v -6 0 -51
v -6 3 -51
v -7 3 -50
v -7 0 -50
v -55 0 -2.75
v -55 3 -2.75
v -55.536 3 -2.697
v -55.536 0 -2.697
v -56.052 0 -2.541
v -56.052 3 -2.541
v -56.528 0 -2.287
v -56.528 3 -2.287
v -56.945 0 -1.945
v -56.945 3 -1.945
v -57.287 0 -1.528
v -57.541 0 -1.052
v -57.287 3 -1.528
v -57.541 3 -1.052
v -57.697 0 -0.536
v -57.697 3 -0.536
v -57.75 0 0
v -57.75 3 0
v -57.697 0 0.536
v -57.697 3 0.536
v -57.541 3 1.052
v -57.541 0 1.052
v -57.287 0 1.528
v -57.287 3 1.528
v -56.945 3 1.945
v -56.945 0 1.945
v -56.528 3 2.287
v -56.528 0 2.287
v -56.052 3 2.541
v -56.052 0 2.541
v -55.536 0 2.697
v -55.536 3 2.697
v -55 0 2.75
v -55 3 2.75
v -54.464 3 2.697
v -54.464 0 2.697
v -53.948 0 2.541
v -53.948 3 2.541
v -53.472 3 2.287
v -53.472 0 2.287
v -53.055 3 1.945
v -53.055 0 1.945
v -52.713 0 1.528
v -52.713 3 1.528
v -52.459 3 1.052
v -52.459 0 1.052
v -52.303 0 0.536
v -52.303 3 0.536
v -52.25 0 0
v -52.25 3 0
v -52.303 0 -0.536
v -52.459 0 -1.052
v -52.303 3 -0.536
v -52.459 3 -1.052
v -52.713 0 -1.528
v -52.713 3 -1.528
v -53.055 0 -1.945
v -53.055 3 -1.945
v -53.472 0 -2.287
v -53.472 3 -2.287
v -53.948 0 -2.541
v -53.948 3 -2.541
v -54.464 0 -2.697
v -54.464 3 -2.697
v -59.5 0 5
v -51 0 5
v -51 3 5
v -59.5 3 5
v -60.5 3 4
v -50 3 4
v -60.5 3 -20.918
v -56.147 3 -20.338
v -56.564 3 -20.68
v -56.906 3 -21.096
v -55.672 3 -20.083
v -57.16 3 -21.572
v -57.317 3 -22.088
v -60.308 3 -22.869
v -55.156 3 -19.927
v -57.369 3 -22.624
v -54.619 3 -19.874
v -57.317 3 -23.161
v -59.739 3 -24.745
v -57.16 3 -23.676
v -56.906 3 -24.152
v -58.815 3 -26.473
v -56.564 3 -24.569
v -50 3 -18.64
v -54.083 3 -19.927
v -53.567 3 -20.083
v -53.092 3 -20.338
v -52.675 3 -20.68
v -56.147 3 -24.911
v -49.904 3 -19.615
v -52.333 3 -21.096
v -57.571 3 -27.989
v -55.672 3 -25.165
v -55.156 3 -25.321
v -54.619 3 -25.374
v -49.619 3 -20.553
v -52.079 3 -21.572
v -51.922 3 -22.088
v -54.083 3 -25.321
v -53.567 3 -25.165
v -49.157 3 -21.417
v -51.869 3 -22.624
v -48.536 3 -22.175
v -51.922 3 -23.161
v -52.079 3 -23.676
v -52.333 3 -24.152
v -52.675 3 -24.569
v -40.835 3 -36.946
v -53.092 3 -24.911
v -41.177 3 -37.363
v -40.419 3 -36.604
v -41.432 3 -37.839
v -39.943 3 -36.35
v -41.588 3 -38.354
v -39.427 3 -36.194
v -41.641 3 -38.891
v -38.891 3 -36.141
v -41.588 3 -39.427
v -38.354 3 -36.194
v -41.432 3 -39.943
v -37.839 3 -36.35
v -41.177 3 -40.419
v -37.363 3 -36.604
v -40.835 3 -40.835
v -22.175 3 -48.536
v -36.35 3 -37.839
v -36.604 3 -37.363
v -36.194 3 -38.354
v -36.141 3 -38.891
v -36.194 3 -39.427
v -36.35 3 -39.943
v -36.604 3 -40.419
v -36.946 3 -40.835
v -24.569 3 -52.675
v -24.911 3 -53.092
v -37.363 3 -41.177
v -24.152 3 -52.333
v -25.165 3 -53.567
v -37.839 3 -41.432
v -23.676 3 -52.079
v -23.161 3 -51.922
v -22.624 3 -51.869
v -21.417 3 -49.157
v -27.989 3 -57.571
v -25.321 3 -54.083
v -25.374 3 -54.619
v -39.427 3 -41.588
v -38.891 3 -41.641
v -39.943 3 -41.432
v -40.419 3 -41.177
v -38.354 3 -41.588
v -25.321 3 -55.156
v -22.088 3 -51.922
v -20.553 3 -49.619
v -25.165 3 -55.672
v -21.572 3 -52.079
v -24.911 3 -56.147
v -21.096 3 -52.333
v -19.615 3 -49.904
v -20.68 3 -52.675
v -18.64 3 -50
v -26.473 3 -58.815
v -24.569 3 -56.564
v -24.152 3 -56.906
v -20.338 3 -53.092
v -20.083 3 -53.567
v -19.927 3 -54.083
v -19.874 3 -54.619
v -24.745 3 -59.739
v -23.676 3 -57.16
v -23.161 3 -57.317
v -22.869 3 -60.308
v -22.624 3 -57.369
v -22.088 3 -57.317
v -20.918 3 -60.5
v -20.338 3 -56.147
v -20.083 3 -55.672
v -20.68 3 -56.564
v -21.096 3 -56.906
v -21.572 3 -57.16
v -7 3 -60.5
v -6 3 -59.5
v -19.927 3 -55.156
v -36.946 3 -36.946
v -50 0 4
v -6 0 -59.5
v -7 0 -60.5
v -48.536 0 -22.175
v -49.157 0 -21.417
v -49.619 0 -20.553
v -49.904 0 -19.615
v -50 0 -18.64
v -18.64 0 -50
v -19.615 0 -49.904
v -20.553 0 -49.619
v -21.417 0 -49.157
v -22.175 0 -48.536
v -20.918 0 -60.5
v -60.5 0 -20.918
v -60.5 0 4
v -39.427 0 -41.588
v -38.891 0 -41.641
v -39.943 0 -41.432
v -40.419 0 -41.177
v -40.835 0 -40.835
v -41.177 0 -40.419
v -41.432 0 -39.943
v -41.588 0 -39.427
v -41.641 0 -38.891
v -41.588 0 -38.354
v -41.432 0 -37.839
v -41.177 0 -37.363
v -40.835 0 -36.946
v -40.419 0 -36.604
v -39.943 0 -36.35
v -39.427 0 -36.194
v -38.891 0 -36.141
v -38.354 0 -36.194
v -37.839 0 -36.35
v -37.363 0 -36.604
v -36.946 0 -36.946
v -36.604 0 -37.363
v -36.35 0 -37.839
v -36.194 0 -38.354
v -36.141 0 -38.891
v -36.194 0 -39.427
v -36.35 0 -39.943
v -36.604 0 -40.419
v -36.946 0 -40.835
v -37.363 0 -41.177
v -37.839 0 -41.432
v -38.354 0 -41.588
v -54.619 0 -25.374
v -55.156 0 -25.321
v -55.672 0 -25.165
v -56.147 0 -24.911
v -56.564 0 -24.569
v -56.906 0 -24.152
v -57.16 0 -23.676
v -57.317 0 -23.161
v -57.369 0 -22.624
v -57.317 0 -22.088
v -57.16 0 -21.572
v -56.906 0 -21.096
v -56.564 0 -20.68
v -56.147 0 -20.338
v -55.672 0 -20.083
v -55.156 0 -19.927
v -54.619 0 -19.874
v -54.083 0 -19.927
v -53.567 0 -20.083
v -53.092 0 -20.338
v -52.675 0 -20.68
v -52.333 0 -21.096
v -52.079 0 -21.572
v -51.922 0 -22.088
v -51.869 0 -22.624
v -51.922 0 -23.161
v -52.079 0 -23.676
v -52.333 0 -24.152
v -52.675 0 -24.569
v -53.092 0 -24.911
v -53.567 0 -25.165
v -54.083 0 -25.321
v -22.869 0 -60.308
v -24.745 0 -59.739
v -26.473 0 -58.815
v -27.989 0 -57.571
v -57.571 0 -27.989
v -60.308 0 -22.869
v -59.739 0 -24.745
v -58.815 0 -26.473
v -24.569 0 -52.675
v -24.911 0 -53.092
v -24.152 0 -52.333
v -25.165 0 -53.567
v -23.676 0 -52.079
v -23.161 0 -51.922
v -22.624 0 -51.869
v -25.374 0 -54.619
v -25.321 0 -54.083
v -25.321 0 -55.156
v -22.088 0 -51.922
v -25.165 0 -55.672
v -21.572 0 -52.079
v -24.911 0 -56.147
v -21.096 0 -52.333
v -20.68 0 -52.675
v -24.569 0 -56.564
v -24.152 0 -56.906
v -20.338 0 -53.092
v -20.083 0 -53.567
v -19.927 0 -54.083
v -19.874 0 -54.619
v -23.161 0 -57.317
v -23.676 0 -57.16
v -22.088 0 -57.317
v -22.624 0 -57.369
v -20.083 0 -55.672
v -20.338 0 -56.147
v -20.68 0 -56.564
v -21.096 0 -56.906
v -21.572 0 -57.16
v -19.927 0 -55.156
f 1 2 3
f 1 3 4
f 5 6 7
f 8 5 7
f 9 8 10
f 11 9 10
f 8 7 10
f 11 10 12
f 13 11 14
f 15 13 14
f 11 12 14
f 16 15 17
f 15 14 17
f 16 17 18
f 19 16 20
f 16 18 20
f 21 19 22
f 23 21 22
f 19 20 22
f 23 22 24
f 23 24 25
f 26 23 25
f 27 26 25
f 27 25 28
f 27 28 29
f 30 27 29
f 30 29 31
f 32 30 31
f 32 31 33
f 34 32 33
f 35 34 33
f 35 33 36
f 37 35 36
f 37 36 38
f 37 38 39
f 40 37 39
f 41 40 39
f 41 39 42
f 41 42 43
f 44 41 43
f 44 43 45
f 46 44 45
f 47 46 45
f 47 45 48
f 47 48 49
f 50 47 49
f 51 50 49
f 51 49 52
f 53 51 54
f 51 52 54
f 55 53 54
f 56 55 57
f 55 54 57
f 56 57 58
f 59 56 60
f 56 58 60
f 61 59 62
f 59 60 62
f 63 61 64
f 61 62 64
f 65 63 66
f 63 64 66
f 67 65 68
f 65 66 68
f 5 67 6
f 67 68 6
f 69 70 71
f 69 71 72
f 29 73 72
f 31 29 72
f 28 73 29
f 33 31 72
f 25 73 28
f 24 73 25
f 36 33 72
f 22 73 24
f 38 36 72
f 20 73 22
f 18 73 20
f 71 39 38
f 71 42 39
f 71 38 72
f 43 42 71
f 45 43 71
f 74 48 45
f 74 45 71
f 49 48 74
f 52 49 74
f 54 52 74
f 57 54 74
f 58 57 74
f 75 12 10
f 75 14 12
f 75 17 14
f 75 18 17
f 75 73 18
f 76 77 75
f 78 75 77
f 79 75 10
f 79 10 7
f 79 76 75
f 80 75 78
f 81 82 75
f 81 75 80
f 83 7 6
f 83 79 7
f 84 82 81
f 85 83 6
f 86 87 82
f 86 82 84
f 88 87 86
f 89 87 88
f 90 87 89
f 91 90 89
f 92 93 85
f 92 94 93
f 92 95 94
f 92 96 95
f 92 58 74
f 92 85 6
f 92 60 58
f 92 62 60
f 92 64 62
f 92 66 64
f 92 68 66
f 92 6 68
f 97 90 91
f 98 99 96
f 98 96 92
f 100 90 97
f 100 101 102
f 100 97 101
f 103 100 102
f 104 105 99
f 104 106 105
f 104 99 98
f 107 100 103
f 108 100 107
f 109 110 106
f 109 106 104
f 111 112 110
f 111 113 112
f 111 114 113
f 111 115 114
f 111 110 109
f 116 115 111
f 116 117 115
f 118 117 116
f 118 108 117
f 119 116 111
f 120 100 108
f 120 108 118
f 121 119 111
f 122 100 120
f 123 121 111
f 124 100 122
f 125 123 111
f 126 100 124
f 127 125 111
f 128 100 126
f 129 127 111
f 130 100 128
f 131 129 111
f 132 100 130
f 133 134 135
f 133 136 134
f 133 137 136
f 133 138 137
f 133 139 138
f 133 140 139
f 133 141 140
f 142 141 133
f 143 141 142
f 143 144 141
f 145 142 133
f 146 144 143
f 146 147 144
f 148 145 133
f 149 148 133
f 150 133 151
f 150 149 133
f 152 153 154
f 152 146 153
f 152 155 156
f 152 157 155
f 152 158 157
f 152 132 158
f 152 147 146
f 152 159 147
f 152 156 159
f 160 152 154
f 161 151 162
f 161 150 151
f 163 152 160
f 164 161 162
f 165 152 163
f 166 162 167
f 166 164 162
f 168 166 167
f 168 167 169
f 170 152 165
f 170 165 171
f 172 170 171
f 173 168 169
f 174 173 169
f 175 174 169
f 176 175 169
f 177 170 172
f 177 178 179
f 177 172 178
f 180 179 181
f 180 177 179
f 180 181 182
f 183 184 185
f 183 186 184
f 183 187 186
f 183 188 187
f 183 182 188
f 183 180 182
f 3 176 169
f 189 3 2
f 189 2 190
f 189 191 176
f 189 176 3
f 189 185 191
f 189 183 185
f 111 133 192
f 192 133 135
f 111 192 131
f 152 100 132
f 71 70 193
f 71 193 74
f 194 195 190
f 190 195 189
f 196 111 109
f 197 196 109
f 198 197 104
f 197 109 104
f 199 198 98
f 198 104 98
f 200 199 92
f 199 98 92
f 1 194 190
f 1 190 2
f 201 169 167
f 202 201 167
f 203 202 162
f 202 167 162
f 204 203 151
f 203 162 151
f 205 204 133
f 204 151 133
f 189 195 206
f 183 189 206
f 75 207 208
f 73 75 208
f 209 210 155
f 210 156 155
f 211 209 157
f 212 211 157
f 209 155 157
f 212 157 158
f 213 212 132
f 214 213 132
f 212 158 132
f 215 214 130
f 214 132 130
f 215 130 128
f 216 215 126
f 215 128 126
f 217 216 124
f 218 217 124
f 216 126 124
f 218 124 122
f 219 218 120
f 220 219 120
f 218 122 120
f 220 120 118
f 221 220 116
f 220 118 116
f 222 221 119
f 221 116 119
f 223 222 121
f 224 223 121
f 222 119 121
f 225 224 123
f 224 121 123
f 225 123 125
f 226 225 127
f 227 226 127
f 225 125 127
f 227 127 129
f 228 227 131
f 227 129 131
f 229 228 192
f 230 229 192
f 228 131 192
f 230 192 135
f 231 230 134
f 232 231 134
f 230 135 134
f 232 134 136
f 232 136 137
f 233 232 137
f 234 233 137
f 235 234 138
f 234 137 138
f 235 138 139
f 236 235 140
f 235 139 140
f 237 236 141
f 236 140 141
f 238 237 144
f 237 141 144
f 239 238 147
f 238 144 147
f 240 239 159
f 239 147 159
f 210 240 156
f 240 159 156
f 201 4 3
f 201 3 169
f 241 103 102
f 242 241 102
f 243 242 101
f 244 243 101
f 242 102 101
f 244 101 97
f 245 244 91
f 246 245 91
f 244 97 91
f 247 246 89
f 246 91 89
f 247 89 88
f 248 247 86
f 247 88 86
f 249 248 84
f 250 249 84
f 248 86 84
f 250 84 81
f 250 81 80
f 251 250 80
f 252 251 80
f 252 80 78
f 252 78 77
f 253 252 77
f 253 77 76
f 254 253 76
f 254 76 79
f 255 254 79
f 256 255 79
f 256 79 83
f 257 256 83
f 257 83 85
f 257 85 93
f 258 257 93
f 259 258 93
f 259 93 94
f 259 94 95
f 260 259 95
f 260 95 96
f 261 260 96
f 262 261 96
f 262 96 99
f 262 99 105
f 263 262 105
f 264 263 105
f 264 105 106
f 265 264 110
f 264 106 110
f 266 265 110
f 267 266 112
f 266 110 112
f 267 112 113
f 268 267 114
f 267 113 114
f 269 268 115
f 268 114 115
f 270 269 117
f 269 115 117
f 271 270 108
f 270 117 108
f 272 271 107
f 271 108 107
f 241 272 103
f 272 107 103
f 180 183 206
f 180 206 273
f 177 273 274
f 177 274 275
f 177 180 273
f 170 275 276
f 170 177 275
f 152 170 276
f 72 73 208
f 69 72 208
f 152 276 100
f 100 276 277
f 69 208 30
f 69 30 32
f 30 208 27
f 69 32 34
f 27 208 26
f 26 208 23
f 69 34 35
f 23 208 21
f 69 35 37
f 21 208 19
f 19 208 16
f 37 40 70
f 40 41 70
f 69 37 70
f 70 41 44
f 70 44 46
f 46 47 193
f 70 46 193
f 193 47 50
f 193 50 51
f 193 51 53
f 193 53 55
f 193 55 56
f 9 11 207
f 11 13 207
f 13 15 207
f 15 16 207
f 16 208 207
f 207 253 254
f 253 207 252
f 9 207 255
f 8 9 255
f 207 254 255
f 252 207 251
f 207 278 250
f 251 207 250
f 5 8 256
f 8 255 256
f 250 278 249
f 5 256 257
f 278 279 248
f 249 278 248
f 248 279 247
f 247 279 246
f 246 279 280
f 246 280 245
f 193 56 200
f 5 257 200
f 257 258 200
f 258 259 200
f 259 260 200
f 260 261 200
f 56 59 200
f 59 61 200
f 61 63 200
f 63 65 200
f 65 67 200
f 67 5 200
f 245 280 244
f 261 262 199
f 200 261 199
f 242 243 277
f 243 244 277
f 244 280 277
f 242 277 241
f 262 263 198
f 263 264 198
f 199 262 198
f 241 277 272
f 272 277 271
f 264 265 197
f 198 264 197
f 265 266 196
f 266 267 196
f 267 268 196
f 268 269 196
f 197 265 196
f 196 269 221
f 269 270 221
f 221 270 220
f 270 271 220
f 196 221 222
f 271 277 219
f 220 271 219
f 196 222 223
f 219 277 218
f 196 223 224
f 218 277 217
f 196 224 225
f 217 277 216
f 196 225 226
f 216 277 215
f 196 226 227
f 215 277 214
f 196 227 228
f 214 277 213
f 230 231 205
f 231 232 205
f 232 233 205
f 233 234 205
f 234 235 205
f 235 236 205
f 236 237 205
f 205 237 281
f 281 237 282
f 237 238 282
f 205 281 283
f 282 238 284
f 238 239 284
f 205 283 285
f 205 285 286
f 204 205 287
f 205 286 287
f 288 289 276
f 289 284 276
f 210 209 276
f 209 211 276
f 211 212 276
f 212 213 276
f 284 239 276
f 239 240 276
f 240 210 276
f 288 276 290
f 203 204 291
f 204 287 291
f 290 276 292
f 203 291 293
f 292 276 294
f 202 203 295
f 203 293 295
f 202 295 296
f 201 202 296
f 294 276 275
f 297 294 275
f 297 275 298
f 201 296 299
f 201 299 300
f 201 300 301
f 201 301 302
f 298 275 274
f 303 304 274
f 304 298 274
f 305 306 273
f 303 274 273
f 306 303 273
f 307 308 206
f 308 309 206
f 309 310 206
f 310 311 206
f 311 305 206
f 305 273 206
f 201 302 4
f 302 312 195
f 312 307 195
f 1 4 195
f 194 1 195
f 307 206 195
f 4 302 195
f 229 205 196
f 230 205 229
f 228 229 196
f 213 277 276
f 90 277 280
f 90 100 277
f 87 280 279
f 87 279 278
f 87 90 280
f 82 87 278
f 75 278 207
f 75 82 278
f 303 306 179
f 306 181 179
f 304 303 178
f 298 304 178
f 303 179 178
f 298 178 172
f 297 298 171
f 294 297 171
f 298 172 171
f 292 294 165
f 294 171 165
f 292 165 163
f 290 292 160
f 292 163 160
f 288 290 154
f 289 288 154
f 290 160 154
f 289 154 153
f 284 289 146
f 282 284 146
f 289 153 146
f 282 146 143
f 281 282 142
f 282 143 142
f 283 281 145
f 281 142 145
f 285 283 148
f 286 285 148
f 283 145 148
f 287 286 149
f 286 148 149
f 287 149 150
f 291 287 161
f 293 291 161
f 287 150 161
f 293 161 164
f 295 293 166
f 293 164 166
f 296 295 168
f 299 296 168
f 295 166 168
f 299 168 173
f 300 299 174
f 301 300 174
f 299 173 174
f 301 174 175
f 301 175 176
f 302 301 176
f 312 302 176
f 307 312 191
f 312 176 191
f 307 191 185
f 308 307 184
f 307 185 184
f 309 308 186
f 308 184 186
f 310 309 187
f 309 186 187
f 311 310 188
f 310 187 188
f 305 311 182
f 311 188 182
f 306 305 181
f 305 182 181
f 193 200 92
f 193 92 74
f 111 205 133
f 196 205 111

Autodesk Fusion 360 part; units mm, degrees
sketch "Sketch1" plane through (0, 0, 0) normal (0, 1, 0) x (1, 0, 0)
  circle A0 centre (0, 0) radius 55 construction
  line L0 (48, 0) -> (48, 19.8823)
  line L1 (48, 19.8823) -> (19.8823, 48)
  line L2 (19.8823, 48) -> (-19.8823, 48)
  line L3 (-19.8823, 48) -> (-48, 19.8823)
  line L4 (-48, 19.8823) -> (-48, 0)
  line L5 (-48, 0) -> (48, 0) construction
  line L6 (0, -1.75) -> (0, -22.5) construction
  line L7 (50, 0) -> (50, 20.7107)
  line L8 (50, 20.7107) -> (20.7107, 50)
  line L9 (20.7107, 50) -> (-20.7107, 50)
  line L10 (-20.7107, 50) -> (-50, 20.7107)
  line L11 (-50, 20.7107) -> (-50, 0)
  line L12 (0, 0) -> (-54.6194, 22.6241) construction
  line L13 (60.5, 0) -> (60.5, 25.0599)
  line L14 (60.5, 25.0599) -> (25.0599, 60.5)
  line L15 (25.0599, 60.5) -> (-25.0599, 60.5)
  line L16 (-25.0599, 60.5) -> (-60.5, 25.0599)
  line L17 (-60.5, 25.0599) -> (-60.5, 0)
  line L18 (0, 60.5) -> (0, 50)
  line L19 (-50, 0) -> (-50, -5)
  line L20 (-50, -5) -> (-60.5, -5)
  line L21 (-60.5, -5) -> (-60.5, 0)
  line L22 (-6, 60.5) -> (-6, 50)
  point P0 (-55, 0)
  point P1 (-38.8909, -38.8909)
  point P2 (-54.6194, -22.6241)
  point P3 (0, -55)
  point P4 (-22.6241, -54.6194)
  point P5 (38.8909, -38.8909)
  point P6 (22.6241, -54.6194)
  point P7 (55, 0)
  point P8 (54.6194, -22.6241)
  point P9 (38.8909, 38.8909)
  point P10 (54.6194, 22.6241)
  point P11 (0, 55)
  point P12 (22.6241, 54.6194)
  point P13 (-38.8909, 38.8909)
  point P14 (-22.6241, 54.6194)
  dimension "d1" = 110
  dimension "d21" = 96
  dimension "d22" = 48
  dimension "d23" = 45
  dimension "d26" = 2
  dimension "d28" = 5
  dimension "d29" = 12.5
  dimension "d31" = 360
  dimension "d39" = 5
  dimension "d40" = 6
extrude "Extrude3" add sketch "Sketch1" along normal blind 3 contours L9 L10 L11 L15 L16 L17 L19 L20 L21 L22
hole "Hole2" at (-54.6194, 0, -22.6241) at (-38.8909, 0, -38.8909) at (-22.6241, 0, -54.6194) at (-55, 0, 0) direction (0, 1, 0) diameter 5.5 depth 5 tip angle 118
fillet "Fillet1" radius 10 2 edges at (-60.5, 1.5, -25.0599) (-25.0599, 1.5, -60.5)
fillet "Fillet2" radius 5 2 edges at (-50, 1.5, -20.7107) (-20.7107, 1.5, -50)
chamfer "Chamfer2" distance 1 angle 45 4 edges at (-50, 1.5, 5) (-60.5, 1.5, 5) (-6, 1.5, -50) (-6, 1.5, -60.5)
sketch "Sketch2" plane through (0, 3, 0) normal (0, 1, 0) x (-1, 0, 0)
  line L0 (6, -59.5) -> (7, -60.5)
  line L1 (7, -60.5) -> (20.9178, -60.5)
  arc A0 (20.9178, -60.5) -> (27.9889, -57.5711) centre (20.9178, -50.5) ccw
  line L2 (27.9889, -57.5711) -> (57.5711, -27.9889)
  arc A1 (57.5711, -27.9889) -> (60.5, -20.9178) centre (50.5, -20.9178) ccw
  line L3 (60.5, -20.9178) -> (60.5, 4)
  line L4 (60.5, 4) -> (59.5, 5)
  line L5 (59.5, 5) -> (51, 5)
  line L6 (51, 5) -> (50, 4)
  line L7 (50, 4) -> (50, -18.6396)
  arc A2 (48.5355, -22.1751) -> (50, -18.6396) centre (45, -18.6396) ccw
  line L8 (48.5355, -22.1751) -> (22.1751, -48.5355)
  arc A3 (18.6396, -50) -> (22.1751, -48.5355) centre (18.6396, -45) ccw
  line L9 (18.6396, -50) -> (7, -50)
  line L10 (7, -50) -> (6, -51)
  line L11 (6, -51) -> (6, -59.5)
  circle A4 centre (22.6241, -54.6194) radius 2.75
  circle A5 centre (54.6194, -22.6241) radius 2.75
  circle A6 centre (38.8909, -38.8909) radius 2.75
  circle A7 centre (55, 0) radius 2.75
